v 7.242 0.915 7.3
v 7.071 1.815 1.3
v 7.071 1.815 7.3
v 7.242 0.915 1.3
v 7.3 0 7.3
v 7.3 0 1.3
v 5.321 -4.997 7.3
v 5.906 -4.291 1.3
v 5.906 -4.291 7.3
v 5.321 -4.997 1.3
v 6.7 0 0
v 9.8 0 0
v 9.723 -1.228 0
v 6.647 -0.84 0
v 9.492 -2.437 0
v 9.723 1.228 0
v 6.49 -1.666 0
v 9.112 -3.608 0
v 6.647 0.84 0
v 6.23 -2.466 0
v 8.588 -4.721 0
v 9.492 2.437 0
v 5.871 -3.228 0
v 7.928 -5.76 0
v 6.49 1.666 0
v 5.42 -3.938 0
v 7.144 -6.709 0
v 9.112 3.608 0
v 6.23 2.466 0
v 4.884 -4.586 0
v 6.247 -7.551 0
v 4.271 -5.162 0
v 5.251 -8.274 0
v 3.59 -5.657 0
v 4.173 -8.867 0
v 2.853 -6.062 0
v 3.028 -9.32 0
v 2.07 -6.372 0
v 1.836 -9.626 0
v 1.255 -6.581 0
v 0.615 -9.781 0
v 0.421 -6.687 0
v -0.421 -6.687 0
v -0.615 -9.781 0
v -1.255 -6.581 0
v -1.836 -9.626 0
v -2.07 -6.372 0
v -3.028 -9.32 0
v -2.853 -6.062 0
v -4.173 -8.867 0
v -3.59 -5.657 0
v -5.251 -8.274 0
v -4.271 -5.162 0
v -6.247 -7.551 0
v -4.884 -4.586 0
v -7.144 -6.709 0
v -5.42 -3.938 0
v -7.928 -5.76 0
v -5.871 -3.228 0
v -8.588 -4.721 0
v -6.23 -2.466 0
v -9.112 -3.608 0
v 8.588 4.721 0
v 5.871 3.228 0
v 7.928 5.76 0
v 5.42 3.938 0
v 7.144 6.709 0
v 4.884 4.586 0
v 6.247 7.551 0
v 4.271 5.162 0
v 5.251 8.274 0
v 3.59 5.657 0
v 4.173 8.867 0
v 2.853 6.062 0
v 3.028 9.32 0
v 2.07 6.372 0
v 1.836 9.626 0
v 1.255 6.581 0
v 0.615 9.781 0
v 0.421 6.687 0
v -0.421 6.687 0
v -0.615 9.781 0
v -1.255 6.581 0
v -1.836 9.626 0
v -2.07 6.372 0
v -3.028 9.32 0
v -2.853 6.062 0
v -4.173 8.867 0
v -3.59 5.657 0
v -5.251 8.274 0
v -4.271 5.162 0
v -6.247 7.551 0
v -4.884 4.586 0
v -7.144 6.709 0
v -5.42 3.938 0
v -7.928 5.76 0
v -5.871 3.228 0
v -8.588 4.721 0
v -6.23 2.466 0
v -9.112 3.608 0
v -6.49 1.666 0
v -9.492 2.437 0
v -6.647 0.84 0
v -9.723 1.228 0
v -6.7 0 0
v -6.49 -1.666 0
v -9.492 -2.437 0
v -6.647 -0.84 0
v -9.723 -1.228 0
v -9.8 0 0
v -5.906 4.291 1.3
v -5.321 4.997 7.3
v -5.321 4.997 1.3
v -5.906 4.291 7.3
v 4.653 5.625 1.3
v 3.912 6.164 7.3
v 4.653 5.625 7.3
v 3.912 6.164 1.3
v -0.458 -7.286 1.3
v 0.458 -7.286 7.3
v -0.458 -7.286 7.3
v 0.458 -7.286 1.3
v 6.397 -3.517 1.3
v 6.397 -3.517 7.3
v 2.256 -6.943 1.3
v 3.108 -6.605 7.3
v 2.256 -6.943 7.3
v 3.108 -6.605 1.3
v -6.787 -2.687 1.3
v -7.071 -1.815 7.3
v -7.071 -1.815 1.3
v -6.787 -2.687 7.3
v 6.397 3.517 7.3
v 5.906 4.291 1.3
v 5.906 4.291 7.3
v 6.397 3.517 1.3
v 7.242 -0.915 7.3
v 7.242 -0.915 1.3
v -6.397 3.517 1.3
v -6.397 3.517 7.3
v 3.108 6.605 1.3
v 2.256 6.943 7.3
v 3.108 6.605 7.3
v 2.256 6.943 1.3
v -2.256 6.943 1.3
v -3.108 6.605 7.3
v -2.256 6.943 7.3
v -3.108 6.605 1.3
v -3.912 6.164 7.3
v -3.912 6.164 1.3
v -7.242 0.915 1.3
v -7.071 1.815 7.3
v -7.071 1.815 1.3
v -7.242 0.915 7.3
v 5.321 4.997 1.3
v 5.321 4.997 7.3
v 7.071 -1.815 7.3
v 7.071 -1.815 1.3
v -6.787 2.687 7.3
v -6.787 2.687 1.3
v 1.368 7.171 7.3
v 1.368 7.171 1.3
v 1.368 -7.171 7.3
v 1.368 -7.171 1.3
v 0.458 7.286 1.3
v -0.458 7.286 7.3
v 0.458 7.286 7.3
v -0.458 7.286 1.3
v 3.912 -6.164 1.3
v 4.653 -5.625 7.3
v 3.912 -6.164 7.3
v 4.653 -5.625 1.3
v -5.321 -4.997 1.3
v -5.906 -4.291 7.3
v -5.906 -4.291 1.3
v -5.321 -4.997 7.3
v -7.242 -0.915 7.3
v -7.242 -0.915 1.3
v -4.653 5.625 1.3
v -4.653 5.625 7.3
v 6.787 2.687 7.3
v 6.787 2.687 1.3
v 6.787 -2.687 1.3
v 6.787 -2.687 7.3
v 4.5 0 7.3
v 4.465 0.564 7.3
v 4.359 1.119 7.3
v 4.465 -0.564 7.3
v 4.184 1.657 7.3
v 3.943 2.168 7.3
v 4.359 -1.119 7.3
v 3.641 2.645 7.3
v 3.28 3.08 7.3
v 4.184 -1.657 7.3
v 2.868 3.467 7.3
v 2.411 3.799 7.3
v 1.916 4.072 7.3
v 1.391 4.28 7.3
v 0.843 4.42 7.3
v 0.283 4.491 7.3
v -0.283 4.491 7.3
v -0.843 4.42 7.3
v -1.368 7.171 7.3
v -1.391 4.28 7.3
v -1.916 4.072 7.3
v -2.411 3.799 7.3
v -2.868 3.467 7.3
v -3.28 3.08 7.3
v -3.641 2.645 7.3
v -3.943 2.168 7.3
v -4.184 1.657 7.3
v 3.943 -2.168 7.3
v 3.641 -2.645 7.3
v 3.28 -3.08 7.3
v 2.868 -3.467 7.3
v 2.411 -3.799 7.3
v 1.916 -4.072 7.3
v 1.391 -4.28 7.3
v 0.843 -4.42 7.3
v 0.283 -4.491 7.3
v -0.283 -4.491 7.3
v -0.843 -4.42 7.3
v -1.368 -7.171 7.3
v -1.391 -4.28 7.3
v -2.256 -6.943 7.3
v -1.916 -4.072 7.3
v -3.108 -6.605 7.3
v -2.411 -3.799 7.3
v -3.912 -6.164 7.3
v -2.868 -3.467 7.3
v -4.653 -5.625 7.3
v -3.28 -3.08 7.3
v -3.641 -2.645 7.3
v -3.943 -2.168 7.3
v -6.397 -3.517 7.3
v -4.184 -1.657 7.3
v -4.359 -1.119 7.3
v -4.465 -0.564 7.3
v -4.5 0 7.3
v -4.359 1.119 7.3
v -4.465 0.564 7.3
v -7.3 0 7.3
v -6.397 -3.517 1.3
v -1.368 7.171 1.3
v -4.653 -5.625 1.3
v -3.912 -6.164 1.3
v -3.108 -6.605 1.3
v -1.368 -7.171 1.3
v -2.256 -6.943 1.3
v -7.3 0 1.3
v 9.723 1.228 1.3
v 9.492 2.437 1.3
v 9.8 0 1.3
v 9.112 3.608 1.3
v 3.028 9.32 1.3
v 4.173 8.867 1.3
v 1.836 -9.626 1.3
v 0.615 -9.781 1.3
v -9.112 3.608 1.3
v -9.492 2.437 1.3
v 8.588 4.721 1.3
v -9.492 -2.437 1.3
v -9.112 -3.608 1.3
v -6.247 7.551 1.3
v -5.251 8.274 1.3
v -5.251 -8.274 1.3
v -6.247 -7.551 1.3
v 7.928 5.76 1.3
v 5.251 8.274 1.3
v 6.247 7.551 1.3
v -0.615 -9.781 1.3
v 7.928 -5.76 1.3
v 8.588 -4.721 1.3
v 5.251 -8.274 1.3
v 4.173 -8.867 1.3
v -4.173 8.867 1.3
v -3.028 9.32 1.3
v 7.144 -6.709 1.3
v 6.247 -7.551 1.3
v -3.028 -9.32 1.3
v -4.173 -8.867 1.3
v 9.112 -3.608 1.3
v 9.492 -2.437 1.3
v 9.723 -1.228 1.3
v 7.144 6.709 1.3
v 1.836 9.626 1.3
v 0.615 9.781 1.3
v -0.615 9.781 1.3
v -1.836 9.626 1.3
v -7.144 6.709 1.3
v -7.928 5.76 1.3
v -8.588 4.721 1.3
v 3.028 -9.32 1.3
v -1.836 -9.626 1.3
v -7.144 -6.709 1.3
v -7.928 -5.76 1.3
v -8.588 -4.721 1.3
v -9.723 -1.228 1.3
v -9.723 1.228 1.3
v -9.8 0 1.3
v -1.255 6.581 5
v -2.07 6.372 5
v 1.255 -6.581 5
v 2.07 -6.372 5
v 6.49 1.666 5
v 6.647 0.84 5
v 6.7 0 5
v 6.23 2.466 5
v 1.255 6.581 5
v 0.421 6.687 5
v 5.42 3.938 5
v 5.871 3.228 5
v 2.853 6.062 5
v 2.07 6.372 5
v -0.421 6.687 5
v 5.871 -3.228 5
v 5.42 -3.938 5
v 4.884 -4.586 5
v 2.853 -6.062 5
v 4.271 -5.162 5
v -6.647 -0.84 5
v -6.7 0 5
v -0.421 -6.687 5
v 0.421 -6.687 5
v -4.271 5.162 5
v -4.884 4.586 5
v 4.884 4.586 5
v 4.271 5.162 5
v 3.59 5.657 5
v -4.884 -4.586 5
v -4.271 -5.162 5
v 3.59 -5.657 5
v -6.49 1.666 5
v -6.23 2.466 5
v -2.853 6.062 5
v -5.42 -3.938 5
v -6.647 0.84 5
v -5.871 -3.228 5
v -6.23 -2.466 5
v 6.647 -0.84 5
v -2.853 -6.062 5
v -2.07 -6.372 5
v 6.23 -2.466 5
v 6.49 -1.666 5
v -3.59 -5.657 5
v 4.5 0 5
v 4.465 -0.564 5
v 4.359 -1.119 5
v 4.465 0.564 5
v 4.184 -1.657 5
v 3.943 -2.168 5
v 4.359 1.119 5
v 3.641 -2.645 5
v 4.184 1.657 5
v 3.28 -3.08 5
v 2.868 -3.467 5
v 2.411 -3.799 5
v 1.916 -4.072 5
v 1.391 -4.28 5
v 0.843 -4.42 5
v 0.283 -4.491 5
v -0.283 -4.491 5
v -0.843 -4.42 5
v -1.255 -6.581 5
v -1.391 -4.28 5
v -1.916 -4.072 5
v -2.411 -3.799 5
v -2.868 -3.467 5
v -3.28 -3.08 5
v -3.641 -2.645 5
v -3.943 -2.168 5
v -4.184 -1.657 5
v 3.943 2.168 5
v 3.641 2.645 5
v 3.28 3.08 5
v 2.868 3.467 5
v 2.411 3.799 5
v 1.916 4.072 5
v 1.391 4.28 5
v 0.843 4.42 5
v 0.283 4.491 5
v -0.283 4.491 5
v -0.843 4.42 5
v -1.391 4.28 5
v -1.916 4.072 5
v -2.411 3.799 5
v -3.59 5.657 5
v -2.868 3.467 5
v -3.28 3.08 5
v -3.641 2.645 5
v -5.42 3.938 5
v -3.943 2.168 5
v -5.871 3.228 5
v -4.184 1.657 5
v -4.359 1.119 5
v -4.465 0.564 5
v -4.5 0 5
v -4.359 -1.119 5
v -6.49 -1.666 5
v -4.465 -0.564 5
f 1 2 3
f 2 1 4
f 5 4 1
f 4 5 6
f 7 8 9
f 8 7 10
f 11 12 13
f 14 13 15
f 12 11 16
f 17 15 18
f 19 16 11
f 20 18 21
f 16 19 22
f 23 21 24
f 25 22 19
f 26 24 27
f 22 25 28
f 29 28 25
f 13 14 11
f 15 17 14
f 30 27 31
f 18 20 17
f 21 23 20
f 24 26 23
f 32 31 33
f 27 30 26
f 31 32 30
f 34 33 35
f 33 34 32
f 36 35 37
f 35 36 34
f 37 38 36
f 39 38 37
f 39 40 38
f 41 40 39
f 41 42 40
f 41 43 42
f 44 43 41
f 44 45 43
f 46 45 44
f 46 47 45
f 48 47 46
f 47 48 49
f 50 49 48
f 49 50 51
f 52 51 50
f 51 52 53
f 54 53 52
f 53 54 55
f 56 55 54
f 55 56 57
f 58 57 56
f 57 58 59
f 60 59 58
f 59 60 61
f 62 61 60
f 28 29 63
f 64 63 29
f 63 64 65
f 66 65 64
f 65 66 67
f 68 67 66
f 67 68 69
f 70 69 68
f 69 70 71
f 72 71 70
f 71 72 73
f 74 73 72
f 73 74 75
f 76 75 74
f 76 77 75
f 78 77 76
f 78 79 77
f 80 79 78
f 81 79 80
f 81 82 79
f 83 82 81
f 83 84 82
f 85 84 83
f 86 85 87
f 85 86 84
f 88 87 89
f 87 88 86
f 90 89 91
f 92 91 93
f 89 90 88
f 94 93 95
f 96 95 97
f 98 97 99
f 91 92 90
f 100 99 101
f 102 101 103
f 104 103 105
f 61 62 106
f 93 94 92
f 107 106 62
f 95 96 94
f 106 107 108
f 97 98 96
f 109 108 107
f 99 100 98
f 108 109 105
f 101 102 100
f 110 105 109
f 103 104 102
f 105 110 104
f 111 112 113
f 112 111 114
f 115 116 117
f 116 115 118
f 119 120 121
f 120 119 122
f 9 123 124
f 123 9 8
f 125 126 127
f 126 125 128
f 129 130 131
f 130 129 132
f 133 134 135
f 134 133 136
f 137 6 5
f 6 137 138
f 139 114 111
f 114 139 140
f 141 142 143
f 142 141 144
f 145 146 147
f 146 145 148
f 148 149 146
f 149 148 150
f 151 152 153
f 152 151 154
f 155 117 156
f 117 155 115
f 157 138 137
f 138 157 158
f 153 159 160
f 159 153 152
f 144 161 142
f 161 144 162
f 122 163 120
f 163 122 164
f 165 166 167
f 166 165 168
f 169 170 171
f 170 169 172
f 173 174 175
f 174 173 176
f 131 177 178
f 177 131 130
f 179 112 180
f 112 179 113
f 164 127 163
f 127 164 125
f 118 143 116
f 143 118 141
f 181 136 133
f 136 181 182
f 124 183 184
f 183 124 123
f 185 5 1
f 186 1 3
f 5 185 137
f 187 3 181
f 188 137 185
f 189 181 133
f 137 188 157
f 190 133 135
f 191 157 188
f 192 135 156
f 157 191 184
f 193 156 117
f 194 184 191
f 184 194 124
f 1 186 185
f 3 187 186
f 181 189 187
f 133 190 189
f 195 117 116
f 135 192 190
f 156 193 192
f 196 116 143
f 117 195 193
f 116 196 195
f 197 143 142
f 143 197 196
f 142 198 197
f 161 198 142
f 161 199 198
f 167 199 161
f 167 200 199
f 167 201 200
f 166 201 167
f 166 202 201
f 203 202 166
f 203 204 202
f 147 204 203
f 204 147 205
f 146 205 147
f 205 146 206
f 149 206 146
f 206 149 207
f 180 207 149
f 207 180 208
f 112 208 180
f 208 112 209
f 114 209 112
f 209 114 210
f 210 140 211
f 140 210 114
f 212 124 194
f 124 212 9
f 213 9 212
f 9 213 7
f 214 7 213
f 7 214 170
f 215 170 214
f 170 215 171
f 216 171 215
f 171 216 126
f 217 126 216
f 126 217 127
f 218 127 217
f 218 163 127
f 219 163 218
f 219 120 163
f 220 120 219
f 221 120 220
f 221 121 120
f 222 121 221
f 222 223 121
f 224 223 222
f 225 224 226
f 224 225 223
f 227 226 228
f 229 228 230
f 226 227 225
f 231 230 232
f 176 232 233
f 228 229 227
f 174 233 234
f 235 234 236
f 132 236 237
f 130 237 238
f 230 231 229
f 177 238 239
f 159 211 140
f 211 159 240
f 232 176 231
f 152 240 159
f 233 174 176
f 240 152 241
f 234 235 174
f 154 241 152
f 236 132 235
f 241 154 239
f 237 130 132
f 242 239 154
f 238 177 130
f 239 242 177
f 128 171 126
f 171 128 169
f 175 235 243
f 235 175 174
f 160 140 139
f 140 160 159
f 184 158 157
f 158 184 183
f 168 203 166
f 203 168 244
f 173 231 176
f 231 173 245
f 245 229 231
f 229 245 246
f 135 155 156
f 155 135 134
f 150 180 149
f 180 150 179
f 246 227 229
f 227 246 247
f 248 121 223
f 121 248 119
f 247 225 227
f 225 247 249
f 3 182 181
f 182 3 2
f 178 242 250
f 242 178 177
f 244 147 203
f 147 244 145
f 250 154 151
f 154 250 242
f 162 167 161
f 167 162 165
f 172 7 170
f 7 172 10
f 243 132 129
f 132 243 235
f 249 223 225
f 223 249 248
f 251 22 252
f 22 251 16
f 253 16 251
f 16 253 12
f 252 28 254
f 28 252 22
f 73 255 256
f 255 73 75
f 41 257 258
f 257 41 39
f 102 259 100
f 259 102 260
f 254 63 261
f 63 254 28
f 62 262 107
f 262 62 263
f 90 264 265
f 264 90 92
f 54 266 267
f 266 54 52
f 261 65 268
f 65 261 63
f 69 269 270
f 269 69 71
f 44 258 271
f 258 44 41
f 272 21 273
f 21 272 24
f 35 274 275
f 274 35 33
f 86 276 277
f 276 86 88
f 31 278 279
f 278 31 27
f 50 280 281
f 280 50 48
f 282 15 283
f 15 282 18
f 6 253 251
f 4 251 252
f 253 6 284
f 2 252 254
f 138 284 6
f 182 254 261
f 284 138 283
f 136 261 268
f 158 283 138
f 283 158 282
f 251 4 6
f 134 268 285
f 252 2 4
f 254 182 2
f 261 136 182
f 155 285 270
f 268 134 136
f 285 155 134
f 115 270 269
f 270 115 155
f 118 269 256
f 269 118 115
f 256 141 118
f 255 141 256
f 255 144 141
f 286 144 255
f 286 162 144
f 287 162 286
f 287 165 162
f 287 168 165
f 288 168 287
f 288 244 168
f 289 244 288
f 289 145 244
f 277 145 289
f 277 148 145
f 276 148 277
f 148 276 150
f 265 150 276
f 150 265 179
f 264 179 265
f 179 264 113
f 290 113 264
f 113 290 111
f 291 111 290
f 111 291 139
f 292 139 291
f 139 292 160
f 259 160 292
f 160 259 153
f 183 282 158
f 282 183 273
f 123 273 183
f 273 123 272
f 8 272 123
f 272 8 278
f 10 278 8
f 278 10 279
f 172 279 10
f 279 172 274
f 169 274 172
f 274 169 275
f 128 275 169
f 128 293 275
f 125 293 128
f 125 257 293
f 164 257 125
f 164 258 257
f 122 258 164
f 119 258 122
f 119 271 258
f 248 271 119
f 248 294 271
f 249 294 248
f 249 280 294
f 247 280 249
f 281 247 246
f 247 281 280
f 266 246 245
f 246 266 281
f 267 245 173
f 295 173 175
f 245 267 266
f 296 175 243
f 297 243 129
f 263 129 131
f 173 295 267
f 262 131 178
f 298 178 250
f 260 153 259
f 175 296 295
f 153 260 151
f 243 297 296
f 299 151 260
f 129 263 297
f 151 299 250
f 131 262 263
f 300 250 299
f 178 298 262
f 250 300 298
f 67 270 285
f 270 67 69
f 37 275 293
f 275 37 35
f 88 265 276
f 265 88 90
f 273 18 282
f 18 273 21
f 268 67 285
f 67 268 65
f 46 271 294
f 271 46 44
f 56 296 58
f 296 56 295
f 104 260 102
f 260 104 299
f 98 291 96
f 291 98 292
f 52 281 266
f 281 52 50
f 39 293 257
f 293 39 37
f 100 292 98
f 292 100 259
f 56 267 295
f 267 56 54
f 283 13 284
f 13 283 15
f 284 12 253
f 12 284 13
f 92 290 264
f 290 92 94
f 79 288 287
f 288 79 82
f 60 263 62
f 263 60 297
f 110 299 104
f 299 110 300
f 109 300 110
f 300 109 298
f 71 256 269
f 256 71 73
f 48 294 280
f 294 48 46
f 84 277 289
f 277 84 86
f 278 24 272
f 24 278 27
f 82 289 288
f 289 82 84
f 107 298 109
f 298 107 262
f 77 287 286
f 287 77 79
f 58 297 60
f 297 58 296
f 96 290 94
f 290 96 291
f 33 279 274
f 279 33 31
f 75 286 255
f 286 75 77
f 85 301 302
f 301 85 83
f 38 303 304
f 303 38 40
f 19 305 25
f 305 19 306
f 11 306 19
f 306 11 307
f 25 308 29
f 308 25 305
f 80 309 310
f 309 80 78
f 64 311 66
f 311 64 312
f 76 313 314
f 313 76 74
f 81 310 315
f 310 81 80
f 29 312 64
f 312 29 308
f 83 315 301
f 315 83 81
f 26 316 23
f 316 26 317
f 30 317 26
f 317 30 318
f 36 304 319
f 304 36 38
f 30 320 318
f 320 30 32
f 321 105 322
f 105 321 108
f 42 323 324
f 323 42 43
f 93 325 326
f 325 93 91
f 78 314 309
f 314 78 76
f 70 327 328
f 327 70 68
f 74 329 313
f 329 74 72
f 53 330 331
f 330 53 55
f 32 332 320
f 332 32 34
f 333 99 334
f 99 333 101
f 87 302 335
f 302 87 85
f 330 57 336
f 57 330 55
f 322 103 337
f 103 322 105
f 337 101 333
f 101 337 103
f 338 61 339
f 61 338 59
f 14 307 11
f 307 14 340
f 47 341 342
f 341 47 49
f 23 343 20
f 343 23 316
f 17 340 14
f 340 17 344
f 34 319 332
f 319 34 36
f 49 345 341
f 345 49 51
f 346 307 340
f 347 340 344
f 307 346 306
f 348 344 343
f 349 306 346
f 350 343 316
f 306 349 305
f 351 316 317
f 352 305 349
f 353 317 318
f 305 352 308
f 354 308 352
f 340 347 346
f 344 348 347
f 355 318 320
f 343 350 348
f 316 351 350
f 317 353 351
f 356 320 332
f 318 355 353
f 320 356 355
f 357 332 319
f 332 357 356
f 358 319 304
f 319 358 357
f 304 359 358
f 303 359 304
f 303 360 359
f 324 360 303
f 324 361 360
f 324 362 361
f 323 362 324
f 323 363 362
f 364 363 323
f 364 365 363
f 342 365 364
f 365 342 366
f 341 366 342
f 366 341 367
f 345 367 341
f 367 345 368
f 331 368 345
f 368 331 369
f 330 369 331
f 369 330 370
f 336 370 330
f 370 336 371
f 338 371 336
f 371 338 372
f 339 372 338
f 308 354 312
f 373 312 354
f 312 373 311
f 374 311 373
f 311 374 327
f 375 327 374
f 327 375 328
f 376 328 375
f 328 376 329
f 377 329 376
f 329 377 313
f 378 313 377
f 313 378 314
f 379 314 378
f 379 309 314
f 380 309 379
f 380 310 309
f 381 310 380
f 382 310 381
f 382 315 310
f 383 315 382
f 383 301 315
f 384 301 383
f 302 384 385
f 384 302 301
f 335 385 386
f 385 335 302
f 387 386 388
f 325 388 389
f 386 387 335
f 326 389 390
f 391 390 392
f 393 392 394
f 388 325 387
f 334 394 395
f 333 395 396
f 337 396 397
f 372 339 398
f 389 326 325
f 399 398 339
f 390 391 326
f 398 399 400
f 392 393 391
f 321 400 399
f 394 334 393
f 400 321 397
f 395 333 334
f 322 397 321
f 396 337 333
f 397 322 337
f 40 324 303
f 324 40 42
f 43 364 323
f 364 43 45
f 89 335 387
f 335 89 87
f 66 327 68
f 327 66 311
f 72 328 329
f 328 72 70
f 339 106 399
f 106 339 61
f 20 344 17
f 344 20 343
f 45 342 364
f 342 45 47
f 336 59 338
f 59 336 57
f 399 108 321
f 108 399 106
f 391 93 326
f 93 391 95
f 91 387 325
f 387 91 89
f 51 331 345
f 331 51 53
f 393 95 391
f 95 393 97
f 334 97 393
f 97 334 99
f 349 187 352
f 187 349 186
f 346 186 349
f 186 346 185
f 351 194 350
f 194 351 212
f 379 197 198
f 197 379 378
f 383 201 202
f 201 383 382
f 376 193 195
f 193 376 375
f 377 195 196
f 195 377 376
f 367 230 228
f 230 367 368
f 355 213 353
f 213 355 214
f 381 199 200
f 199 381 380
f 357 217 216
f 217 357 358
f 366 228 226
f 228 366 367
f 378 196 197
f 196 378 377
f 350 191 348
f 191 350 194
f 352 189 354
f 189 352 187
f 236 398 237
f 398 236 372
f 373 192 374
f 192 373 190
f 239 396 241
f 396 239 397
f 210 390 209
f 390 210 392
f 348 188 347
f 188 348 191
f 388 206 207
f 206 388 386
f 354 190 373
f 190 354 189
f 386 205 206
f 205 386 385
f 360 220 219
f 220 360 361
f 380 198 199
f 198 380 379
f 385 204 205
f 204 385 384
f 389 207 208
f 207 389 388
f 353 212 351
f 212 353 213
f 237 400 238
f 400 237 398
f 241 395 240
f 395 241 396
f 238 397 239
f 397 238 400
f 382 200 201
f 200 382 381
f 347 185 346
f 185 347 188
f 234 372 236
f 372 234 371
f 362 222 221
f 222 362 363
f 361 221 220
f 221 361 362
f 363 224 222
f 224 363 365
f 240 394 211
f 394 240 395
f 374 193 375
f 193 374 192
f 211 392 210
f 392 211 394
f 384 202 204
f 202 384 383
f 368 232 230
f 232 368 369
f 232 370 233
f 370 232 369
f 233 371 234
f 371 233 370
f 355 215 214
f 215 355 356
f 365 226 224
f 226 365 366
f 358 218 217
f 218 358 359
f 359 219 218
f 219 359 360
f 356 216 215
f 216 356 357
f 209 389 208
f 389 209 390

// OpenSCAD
inner_rad = 6.5;
wall_thick = 0.8;
tab_height = 1.3;
tab_width = 2.5;

difference(){
    union(){
        cylinder( r = inner_rad + wall_thick, h = 6 + tab_height, $fn = 50 );
        cylinder( r = inner_rad + wall_thick + tab_width, h = tab_height, $fn = 50 );
    }
    translate( [ 0, 0, -( 7.5 + tab_height - 5 ) ] )
        cylinder( r = inner_rad + 0.2, h = 7.5 + tab_height, $fn = 50 );
    translate( [ 0, 0, +1 ] )
        cylinder( r = inner_rad - 2, h = 7.5 + tab_height, $fn = 50 );
}
